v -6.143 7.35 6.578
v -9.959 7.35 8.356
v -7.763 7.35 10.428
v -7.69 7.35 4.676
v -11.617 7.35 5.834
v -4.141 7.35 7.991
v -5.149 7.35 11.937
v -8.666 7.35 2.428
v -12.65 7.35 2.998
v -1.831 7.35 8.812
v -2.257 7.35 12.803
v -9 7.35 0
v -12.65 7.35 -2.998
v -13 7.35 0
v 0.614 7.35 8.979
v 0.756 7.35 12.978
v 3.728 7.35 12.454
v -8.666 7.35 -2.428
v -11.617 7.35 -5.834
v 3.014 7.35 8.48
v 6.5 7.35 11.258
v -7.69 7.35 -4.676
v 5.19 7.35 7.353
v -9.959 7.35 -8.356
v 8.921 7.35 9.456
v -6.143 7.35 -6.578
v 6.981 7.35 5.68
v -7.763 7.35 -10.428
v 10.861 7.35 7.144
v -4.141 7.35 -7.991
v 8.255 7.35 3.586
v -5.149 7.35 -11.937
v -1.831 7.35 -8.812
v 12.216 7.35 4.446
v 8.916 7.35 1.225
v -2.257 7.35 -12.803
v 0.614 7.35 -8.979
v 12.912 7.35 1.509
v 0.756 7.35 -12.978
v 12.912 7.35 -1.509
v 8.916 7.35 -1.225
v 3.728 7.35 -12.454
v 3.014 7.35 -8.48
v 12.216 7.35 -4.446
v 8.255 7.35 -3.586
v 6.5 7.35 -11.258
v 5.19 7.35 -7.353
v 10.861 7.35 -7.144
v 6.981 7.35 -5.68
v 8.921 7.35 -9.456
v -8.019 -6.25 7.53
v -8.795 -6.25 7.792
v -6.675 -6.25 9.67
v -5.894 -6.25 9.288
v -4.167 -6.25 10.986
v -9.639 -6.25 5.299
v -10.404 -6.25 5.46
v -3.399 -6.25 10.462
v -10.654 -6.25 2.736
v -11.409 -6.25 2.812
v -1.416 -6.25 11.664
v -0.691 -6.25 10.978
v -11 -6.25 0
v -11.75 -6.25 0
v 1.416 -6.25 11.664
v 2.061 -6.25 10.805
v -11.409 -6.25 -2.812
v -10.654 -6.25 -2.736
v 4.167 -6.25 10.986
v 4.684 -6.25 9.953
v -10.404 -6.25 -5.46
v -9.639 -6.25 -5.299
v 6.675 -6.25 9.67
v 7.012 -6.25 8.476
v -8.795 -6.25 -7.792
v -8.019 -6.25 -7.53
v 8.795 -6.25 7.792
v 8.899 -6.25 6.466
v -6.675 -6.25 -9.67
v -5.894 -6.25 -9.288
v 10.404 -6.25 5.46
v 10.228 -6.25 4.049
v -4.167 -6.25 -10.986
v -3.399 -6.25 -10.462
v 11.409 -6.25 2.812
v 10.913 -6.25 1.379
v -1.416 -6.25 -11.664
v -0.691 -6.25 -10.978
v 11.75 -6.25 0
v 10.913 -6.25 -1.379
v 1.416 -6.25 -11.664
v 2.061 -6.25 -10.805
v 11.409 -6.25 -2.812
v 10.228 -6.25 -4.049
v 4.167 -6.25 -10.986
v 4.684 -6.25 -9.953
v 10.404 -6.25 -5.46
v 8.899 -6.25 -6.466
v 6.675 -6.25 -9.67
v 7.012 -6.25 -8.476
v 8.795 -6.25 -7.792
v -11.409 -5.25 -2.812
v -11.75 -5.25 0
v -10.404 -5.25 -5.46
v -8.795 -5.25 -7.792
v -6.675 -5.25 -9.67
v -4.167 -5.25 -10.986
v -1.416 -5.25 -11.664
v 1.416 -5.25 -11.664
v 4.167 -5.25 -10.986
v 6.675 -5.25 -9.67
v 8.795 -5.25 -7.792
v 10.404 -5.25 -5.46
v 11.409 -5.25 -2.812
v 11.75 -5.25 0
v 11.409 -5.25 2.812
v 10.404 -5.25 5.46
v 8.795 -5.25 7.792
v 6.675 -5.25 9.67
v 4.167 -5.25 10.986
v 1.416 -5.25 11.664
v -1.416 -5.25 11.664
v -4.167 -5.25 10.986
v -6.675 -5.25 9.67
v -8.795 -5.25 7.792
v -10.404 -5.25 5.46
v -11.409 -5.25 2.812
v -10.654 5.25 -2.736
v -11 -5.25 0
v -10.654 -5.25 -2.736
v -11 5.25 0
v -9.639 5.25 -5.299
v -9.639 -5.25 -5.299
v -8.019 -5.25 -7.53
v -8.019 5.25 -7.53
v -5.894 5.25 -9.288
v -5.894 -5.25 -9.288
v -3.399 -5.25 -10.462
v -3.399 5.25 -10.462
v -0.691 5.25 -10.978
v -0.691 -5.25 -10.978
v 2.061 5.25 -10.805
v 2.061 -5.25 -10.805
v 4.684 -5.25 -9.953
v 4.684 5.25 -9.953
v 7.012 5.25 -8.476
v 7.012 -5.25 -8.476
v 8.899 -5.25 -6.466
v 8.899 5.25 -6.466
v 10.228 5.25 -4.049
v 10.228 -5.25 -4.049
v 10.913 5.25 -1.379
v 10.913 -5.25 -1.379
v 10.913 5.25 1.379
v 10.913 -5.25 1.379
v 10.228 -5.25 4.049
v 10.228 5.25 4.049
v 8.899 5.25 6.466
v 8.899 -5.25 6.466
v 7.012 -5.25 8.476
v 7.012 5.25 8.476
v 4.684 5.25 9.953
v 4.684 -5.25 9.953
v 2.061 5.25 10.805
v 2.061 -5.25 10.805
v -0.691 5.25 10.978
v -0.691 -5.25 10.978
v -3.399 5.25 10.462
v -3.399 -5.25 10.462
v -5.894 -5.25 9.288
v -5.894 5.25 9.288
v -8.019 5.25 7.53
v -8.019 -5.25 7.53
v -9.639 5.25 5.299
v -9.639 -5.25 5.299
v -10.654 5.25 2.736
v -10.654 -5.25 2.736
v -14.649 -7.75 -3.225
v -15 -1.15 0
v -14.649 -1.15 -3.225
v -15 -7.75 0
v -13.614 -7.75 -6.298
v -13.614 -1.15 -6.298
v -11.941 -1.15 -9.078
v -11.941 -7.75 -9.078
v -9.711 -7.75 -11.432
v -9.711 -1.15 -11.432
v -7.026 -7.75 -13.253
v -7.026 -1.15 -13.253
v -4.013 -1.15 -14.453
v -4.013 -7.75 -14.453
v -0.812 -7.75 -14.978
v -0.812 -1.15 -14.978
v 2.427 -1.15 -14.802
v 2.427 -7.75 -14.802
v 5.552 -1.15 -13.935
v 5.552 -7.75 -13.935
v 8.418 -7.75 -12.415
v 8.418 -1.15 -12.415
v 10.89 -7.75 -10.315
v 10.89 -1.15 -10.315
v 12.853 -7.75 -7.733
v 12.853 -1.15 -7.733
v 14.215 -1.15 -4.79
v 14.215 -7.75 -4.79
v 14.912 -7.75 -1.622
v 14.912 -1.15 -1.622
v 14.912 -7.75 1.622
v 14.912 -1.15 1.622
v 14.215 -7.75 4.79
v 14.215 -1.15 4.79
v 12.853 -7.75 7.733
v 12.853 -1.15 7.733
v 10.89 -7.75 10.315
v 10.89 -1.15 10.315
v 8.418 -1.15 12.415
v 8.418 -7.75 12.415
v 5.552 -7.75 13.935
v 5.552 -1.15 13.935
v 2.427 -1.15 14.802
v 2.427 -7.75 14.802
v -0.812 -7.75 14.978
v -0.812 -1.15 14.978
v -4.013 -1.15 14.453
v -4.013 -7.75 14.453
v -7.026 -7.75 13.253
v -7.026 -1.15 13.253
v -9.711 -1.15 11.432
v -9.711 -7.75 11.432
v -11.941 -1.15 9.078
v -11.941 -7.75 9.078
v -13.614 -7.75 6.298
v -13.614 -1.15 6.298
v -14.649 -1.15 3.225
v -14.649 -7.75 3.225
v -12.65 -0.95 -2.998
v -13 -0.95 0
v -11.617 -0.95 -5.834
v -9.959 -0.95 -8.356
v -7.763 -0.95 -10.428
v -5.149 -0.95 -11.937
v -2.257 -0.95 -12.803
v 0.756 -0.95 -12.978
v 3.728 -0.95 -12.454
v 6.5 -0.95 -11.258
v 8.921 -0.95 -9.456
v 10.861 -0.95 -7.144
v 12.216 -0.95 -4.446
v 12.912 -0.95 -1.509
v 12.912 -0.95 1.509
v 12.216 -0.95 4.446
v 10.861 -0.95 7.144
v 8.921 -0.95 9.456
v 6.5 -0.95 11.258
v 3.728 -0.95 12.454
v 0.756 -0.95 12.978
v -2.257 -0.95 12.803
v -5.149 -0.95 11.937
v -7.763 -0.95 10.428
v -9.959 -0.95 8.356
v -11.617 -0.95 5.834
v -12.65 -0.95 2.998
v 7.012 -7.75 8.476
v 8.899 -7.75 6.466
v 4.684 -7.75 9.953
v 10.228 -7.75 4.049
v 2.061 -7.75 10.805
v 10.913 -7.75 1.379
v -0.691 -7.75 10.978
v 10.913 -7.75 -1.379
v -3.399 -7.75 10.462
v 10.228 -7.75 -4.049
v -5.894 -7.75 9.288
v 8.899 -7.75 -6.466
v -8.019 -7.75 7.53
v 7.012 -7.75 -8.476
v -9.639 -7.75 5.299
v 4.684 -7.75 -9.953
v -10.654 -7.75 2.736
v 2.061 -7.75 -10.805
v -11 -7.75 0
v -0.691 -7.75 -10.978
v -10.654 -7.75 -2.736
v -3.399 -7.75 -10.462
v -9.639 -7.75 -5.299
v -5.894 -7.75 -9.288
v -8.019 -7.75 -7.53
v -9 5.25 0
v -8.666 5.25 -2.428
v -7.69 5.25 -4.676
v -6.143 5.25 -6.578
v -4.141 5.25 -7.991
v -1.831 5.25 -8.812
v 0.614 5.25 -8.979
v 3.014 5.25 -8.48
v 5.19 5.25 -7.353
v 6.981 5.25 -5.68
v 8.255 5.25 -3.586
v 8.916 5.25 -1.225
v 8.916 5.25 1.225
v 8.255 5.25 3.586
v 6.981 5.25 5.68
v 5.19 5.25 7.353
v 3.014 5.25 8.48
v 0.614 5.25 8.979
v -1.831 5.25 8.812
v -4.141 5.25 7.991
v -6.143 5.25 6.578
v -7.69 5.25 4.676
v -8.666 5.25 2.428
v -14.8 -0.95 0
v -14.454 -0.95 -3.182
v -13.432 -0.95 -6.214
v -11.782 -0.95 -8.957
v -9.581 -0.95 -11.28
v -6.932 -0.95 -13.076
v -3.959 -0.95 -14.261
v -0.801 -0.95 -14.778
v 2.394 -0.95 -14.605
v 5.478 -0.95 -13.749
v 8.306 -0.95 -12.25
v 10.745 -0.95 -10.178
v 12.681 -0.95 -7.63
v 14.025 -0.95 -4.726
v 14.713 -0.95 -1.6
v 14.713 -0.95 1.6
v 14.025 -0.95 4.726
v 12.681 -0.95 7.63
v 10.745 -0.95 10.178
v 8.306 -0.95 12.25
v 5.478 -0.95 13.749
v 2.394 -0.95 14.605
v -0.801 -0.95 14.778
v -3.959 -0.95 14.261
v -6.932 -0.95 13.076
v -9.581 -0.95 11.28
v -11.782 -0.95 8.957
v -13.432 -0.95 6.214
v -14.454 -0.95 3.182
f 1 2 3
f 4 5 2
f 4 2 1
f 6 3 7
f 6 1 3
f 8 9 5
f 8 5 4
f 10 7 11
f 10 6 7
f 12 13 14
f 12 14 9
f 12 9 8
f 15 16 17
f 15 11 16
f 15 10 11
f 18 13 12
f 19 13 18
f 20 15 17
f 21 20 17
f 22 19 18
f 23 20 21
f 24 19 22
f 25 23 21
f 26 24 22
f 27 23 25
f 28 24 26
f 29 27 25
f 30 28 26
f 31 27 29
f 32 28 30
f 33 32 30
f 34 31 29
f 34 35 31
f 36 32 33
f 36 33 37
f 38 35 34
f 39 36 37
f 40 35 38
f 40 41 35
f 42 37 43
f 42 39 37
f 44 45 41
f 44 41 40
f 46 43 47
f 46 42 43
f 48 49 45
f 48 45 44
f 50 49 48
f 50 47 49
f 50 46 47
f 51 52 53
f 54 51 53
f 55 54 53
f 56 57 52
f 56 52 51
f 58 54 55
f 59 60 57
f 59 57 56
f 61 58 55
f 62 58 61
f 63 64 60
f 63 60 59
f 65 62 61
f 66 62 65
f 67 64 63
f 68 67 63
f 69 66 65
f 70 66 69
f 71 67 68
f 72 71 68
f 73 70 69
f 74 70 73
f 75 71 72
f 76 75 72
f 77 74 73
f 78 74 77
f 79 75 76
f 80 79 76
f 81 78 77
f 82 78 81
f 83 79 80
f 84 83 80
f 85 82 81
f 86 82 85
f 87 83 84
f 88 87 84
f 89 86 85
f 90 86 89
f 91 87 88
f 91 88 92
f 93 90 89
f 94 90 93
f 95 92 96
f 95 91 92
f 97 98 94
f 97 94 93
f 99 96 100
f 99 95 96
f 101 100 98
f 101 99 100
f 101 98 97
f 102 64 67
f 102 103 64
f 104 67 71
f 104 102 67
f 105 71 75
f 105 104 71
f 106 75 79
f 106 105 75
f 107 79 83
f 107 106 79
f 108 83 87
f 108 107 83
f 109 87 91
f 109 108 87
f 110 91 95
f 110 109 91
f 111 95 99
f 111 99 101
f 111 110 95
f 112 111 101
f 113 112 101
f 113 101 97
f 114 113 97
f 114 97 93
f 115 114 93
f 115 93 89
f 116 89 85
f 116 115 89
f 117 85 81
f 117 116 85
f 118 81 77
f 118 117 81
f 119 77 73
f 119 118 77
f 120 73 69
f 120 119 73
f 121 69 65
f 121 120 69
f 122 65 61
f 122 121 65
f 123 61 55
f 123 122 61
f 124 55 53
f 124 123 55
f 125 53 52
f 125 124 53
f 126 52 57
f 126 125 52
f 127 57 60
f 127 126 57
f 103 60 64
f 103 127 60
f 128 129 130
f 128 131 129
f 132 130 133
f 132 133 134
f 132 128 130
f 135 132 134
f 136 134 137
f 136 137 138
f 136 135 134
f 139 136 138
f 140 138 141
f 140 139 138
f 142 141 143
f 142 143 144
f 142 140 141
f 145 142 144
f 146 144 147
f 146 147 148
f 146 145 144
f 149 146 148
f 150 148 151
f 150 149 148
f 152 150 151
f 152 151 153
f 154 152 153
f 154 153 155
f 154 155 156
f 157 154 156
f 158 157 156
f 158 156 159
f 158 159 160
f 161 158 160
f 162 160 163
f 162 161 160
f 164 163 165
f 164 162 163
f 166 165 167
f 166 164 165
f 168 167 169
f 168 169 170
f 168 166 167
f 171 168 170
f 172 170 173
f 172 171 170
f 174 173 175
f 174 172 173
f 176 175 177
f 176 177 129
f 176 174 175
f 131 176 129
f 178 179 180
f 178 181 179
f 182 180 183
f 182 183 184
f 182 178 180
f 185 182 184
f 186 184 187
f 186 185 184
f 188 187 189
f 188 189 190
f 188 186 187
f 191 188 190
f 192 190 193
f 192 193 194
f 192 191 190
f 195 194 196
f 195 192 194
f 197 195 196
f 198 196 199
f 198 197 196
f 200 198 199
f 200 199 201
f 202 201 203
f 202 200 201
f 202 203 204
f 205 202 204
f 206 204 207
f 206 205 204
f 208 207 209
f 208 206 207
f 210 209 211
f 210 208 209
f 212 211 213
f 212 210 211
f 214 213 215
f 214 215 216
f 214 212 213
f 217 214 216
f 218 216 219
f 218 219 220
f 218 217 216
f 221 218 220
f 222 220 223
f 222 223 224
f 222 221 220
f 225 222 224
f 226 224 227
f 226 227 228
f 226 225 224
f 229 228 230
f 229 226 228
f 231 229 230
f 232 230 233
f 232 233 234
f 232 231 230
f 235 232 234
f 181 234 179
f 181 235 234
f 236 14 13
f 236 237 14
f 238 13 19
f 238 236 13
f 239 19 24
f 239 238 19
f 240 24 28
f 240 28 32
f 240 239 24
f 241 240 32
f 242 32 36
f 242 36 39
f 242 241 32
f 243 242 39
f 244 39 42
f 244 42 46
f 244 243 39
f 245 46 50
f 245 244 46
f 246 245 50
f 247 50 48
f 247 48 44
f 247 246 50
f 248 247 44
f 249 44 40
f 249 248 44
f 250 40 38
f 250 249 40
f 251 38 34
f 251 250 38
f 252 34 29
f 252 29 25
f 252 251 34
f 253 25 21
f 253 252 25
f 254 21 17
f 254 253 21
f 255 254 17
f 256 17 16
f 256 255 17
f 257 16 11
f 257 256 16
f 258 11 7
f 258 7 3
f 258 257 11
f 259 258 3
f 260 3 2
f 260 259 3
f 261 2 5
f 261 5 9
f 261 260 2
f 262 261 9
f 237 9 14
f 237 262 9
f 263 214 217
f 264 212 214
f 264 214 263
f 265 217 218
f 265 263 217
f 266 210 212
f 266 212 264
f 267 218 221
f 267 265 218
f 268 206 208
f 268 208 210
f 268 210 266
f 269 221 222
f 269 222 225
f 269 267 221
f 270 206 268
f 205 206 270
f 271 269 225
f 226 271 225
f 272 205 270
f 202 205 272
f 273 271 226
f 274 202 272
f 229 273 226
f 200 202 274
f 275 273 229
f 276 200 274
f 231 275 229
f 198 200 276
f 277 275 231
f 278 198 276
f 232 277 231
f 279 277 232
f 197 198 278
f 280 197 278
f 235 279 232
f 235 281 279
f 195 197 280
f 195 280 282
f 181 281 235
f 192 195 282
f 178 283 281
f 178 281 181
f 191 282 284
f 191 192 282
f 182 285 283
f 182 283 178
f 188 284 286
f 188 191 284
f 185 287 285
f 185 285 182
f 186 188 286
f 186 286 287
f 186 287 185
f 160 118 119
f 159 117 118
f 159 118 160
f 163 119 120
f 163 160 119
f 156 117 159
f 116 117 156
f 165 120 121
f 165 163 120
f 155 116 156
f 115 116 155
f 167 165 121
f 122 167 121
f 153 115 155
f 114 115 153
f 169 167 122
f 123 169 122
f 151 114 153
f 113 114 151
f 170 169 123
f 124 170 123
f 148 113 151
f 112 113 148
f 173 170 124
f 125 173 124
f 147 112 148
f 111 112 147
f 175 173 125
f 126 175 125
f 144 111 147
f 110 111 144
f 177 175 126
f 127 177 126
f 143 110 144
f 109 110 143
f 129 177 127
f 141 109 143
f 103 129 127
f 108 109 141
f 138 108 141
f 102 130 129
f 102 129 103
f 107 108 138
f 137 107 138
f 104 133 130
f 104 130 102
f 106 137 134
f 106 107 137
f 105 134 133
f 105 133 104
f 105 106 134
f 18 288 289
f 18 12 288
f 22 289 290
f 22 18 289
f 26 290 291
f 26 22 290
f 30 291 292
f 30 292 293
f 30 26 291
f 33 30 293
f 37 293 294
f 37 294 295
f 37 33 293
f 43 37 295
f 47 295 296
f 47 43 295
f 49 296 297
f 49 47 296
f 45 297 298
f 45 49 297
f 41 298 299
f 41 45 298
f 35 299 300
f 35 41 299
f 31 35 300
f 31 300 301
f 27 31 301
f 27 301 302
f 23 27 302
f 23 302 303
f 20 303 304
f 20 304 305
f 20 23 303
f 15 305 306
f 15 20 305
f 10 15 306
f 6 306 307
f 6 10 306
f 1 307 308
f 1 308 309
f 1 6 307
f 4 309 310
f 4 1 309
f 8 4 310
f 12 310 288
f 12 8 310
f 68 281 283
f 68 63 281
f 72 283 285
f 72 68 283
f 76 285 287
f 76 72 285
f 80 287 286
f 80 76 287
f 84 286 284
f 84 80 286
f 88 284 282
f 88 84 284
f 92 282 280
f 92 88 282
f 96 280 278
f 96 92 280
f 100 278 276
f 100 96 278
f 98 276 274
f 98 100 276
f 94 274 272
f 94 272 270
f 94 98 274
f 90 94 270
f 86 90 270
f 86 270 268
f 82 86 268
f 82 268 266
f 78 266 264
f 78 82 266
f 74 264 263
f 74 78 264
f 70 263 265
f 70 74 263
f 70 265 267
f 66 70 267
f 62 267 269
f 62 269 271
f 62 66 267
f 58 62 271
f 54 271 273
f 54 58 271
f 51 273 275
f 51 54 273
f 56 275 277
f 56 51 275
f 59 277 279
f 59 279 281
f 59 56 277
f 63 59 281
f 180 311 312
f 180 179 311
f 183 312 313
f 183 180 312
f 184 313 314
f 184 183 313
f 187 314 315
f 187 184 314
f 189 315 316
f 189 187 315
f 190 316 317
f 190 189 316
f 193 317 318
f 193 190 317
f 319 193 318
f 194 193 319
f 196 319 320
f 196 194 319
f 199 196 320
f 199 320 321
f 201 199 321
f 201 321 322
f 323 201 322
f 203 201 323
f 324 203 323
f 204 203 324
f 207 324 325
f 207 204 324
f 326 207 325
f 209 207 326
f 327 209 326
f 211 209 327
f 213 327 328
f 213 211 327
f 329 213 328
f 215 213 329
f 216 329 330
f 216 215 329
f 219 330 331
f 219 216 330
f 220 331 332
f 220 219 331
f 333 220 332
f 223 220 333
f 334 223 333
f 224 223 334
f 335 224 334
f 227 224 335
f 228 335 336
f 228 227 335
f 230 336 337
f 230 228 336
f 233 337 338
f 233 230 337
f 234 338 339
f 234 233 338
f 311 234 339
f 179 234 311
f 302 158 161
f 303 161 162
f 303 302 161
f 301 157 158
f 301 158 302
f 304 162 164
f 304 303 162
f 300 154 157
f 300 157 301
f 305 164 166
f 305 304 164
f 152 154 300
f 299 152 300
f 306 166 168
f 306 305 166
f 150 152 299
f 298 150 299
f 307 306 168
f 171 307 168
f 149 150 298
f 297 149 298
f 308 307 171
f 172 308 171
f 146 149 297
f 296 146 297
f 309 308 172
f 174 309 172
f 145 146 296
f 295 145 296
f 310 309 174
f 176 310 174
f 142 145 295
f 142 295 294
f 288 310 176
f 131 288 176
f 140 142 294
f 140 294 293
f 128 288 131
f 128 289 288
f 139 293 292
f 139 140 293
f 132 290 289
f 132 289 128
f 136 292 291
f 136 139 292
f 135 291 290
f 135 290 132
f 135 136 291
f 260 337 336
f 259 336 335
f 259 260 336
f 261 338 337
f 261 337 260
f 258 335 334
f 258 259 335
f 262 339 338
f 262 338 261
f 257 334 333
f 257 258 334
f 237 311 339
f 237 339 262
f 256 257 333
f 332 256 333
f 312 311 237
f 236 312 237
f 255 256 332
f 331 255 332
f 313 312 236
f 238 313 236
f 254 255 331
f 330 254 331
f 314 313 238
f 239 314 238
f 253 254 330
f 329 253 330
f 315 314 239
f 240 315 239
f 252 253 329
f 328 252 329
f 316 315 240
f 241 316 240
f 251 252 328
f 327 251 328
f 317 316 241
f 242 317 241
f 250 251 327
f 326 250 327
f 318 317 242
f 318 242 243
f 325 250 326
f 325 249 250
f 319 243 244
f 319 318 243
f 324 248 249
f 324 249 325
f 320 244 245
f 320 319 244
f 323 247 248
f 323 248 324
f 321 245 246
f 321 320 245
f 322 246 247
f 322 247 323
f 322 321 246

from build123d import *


with BuildPart() as part:
    # Sketch1 → Revolve1 (revolve)
    with BuildSketch(Plane.XY):
        Polygon((-9, 7.35), (-13, 7.35), (-13, -0.95), (-14.8, -0.95), (-15, -1.15), (-15, -7.75), (-11, -7.75), (-11, -6.25), (-11.75, -6.25), (-11.75, -5.25), (-11, -5.25), (-11, 5.25), (-9, 5.25), align=None)
    revolve(axis=Axis((0, 0, 0), (0, -1, 0)))


solid = part.part
